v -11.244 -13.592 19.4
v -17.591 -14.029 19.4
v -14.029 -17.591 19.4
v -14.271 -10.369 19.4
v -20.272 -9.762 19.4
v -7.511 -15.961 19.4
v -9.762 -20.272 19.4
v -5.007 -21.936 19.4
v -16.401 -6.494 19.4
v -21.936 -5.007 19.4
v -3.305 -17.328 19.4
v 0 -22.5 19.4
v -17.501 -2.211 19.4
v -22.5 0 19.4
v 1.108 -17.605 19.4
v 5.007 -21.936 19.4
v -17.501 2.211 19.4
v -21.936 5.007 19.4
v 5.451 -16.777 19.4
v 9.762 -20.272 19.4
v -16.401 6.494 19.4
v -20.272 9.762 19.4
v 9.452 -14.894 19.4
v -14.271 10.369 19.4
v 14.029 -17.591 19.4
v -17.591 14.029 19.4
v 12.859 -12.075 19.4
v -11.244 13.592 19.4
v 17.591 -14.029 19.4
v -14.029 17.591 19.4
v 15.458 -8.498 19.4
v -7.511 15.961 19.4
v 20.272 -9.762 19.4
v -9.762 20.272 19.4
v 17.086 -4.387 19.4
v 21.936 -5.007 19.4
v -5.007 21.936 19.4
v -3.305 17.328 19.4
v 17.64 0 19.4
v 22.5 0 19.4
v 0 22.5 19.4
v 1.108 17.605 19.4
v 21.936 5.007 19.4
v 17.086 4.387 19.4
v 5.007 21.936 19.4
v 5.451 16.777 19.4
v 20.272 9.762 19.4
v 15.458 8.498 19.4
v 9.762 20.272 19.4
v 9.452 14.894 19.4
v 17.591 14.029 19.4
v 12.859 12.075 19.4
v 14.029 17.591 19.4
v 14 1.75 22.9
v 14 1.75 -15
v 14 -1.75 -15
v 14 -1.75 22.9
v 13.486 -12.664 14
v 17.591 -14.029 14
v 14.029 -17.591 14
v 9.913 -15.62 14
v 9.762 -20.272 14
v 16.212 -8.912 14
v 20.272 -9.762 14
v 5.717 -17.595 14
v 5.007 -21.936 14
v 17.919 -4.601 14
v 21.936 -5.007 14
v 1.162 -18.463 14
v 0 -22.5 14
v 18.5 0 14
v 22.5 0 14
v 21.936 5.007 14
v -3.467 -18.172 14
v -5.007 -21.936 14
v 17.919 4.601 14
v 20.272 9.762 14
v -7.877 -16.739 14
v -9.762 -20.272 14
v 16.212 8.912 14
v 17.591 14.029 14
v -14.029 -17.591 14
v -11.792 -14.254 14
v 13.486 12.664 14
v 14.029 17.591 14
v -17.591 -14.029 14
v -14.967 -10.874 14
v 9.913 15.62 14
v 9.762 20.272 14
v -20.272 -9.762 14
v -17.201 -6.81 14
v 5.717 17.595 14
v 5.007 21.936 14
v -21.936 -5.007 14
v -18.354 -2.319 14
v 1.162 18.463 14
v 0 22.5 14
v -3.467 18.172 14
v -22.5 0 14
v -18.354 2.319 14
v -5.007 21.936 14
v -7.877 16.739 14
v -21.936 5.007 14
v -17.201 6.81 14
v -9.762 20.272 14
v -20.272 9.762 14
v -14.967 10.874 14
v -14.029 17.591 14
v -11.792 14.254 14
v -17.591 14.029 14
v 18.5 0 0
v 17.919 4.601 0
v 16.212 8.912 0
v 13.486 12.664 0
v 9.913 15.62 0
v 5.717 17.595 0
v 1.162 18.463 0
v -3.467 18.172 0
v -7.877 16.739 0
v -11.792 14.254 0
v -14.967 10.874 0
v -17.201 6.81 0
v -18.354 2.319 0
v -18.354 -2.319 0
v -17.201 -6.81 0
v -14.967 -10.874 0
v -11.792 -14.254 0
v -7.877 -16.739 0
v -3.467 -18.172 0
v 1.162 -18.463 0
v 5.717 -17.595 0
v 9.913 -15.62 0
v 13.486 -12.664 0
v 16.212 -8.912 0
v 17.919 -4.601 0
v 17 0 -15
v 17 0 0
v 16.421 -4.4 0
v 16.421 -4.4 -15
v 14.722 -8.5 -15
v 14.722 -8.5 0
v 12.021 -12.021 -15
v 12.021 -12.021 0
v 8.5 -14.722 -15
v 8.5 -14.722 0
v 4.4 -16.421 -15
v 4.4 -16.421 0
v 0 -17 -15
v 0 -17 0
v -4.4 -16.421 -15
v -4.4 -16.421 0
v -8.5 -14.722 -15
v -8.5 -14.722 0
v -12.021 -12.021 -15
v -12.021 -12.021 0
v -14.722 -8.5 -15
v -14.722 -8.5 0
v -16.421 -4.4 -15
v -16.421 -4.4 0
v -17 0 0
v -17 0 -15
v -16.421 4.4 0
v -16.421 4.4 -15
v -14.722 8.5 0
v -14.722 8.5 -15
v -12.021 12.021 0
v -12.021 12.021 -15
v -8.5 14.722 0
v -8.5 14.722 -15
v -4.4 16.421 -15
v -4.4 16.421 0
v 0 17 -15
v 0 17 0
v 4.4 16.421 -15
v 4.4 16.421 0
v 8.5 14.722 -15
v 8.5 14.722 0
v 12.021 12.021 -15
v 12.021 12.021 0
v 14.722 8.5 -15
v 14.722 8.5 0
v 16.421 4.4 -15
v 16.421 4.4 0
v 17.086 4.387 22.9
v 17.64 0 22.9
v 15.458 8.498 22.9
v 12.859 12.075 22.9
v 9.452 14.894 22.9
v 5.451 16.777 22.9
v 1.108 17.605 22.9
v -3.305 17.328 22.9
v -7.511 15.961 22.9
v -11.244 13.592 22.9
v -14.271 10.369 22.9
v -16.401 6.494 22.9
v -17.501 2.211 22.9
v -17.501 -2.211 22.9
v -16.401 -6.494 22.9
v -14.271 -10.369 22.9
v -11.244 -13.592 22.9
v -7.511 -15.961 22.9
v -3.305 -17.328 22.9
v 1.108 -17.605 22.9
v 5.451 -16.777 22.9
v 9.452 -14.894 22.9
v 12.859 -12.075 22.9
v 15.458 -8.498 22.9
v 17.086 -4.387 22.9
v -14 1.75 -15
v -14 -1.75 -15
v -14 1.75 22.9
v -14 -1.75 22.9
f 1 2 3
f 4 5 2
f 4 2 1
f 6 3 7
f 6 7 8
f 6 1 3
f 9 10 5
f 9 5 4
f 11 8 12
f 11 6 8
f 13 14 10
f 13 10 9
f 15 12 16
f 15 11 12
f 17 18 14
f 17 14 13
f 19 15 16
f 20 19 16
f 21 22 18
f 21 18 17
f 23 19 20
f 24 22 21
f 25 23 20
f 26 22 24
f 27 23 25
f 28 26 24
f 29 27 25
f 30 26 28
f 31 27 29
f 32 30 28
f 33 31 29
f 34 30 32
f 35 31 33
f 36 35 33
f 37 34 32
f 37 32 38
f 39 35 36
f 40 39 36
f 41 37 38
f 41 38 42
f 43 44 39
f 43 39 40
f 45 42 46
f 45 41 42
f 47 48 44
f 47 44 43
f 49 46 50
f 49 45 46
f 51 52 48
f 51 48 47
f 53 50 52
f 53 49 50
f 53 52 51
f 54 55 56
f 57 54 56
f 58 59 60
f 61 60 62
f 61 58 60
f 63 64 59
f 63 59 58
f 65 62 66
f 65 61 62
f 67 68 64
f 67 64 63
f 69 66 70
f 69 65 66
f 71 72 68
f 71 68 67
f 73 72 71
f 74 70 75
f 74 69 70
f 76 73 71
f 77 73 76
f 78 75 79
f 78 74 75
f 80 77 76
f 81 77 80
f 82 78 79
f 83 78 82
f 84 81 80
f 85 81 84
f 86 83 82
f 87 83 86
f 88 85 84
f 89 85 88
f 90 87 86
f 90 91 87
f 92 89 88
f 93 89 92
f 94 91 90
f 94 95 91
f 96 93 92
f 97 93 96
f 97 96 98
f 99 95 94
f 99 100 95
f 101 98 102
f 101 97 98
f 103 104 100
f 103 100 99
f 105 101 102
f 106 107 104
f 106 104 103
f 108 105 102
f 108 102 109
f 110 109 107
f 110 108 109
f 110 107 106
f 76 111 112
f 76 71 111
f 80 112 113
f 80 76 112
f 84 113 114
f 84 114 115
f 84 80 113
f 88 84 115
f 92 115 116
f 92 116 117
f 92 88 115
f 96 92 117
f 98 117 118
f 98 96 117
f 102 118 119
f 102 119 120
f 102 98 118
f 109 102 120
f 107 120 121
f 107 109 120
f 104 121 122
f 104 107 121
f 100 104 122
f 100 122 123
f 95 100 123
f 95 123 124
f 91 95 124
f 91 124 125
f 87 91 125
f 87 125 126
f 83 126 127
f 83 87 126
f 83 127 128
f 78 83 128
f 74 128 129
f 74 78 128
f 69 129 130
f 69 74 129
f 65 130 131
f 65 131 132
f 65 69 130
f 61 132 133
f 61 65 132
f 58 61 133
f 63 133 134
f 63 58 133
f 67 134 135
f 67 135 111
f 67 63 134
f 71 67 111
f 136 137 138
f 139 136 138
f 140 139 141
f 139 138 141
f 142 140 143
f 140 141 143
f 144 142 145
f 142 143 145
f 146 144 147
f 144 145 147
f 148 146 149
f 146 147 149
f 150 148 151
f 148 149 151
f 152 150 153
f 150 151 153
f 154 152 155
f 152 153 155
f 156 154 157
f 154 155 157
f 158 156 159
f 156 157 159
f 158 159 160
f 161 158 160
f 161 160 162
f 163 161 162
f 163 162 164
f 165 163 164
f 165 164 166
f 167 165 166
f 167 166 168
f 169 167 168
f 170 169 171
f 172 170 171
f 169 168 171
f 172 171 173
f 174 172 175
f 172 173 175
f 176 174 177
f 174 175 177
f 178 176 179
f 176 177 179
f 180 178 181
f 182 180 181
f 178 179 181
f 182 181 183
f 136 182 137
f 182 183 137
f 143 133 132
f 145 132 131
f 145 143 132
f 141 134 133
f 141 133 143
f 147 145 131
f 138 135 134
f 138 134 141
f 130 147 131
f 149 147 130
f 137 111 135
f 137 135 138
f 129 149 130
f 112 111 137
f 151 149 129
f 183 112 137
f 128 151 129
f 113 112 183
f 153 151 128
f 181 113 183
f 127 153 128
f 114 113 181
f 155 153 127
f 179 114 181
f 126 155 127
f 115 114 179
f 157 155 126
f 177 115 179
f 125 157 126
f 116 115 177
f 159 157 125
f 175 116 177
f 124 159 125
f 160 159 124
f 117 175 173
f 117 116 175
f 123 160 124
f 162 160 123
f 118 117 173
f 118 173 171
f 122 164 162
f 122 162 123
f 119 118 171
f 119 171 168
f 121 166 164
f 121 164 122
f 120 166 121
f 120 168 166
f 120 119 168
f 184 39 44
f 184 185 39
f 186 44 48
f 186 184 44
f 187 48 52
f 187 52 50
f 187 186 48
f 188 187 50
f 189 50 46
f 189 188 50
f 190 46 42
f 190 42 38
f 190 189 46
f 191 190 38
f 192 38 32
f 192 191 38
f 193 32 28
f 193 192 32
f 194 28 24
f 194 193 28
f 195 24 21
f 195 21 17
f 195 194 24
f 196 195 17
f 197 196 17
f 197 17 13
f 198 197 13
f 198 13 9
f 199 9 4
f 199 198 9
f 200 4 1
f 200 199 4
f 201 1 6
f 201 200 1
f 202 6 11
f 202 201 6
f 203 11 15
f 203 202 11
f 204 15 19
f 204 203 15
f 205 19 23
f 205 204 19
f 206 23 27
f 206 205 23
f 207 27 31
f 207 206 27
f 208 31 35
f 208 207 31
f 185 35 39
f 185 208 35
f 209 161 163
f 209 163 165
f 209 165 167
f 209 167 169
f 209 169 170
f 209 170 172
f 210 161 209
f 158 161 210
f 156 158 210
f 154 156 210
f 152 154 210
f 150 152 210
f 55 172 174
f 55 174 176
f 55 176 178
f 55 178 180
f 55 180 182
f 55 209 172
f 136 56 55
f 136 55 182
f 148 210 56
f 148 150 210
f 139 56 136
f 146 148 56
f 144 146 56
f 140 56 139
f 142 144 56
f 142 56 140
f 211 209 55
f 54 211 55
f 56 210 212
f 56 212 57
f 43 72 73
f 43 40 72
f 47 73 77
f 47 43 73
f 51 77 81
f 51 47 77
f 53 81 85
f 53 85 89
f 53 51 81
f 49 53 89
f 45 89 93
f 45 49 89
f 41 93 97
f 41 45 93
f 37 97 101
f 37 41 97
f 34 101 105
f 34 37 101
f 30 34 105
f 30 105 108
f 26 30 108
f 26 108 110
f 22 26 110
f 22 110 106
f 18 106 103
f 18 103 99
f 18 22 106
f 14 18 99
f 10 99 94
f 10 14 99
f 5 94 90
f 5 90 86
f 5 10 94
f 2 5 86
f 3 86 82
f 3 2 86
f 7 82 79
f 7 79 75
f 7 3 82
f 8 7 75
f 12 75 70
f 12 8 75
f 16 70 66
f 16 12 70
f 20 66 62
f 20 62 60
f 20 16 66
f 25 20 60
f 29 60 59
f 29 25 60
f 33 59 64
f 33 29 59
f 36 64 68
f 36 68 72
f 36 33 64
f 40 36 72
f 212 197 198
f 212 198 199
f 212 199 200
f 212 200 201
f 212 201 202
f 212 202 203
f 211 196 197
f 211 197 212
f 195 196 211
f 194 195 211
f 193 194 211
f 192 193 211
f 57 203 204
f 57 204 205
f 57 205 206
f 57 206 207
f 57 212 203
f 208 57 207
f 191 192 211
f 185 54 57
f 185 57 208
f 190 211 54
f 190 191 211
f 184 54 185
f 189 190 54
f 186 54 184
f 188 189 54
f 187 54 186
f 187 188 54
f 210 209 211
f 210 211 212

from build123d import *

# Parameters (mm, degrees)
F2_R     = 17
F3_DEPTH = 15
F4_W     = 28
F4_H     = 3.5
F5_DEPTH = 40


with BuildPart() as f1:
    # F0 (on Front) → F1 (revolve)
    with BuildSketch(Plane.XZ):
        Polygon((0, 22.9), (0, 0), (18.5, 0), (18.5, 14), (22.5, 14), (22.5, 19.4), (17.64, 19.4), (17.64, 22.9), align=None)
    revolve(axis=Axis((0, 0, -1.557709), (0, 0, 1)))

    # F2 (on face) → F3 (join)
    with BuildSketch(Plane(origin=(0, 0, 0), x_dir=(1, 0, 0), z_dir=(0, 0, -1))):
        Circle(F2_R)
    extrude(amount=F3_DEPTH)

    # F4 (on face) → F5 (cut)
    with BuildSketch(Plane(origin=(0, 0, -15), x_dir=(1, 0, 0), z_dir=(0, 0, -1))):
        Rectangle(F4_W, F4_H)
    extrude(amount=-F5_DEPTH, mode=Mode.SUBTRACT)


solid = f1.part
